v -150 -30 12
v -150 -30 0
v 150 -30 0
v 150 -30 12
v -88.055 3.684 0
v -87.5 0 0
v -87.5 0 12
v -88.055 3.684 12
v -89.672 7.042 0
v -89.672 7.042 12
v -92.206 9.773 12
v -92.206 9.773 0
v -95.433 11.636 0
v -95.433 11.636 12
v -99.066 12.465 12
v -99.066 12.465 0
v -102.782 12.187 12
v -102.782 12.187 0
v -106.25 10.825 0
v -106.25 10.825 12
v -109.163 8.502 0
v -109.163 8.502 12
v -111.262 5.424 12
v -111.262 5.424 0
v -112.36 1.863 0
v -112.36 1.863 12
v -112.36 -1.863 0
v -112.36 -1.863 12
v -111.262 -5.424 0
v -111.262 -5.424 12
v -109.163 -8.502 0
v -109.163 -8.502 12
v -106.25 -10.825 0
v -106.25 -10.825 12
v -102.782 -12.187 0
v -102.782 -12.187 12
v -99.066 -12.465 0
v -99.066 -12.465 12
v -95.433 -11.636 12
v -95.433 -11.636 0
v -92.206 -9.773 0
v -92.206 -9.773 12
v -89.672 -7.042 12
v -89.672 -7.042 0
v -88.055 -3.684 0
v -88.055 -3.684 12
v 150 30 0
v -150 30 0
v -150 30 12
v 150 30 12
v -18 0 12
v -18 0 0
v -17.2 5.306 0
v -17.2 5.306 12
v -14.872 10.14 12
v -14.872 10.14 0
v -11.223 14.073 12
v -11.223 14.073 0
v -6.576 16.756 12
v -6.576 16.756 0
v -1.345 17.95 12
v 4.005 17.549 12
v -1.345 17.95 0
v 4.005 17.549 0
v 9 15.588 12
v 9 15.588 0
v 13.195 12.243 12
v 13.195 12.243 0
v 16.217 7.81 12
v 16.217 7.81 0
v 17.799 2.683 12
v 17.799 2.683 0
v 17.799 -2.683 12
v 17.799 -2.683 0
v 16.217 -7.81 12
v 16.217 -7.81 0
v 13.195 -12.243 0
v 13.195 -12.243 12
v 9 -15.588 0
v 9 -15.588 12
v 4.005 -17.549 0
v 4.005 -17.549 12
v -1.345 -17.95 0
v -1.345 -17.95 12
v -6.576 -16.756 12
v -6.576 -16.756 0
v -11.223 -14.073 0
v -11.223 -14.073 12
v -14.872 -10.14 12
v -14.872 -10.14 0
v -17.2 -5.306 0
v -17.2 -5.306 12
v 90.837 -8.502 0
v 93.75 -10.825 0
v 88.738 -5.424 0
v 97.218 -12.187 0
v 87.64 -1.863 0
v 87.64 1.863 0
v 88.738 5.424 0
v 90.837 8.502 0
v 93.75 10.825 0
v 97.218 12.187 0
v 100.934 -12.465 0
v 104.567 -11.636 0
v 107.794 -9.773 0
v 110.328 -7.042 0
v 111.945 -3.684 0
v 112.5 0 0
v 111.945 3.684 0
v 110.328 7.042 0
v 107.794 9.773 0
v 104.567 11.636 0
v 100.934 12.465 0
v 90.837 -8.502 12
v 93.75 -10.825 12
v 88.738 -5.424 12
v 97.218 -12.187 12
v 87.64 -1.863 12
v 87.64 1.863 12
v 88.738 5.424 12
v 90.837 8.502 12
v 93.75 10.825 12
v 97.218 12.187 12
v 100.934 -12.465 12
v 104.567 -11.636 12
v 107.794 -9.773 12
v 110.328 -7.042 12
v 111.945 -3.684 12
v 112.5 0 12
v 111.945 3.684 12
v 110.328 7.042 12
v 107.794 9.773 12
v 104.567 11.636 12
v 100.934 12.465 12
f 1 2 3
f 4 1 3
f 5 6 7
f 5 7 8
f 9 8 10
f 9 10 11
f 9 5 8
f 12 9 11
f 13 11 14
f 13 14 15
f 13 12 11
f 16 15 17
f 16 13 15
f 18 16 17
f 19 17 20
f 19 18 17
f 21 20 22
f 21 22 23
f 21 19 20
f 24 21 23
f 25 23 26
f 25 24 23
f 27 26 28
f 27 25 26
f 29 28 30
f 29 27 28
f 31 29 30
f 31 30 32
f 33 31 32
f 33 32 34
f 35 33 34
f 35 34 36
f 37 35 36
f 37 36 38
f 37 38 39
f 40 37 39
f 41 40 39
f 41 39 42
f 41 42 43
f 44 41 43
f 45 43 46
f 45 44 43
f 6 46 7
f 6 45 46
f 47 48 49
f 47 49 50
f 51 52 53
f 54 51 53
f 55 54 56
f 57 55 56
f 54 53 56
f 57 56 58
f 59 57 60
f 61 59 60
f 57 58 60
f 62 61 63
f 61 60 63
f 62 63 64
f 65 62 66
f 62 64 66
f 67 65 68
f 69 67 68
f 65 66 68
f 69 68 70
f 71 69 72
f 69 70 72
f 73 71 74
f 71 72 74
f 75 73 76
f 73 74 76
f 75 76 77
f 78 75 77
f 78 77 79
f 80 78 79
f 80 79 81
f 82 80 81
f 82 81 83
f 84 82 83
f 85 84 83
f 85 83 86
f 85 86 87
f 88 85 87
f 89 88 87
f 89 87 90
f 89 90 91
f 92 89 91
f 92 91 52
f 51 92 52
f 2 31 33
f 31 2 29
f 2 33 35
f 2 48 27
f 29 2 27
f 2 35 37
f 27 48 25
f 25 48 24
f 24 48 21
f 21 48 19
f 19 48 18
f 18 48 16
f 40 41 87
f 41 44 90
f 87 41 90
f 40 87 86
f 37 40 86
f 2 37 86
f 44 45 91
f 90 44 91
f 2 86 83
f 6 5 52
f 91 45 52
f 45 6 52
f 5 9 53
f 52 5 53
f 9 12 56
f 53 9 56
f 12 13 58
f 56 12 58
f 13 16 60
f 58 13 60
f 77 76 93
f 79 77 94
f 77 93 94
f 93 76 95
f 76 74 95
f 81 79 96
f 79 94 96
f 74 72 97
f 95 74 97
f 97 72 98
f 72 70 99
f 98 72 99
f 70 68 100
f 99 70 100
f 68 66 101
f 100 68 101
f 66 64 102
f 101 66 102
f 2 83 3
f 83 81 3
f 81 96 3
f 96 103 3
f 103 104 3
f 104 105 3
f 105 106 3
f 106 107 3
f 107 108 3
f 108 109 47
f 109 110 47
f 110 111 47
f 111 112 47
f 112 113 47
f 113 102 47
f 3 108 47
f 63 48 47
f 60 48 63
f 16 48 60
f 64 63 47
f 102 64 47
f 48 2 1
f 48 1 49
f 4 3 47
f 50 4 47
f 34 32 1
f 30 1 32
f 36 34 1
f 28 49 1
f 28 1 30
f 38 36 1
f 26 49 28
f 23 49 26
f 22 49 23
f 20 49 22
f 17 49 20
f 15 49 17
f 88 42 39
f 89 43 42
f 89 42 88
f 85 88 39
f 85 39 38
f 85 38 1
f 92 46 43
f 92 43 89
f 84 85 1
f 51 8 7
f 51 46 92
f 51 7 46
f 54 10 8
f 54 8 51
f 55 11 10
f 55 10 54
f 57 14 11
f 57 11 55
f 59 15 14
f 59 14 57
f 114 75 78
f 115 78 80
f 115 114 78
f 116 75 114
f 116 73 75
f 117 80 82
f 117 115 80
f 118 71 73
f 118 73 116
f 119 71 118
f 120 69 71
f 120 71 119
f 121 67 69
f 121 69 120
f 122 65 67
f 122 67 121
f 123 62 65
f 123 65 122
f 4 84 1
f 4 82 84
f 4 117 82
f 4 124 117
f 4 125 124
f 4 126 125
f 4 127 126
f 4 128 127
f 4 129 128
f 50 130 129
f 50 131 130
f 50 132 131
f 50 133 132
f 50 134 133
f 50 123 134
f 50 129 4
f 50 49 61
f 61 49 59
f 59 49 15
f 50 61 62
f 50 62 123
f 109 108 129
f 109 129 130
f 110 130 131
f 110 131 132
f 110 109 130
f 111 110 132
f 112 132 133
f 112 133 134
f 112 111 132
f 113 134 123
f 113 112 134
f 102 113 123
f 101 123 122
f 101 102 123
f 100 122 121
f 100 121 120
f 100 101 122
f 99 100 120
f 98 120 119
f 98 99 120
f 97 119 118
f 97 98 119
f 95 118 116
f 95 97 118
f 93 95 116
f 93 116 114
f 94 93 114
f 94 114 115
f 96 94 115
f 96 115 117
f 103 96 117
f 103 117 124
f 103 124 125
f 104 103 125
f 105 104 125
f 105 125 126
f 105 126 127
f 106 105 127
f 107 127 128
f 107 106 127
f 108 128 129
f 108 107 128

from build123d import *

# Parameters (mm, degrees)
SKETCH_1_W          = 300
SKETCH_1_H          = 60
SKETCH_1_R          = 12.5
EXTRUDE_1_DEPTH     = 12
CUT_EXTRUDE_1_REACH = 155.441
SKETCH_2_R          = 18


with BuildPart() as part:
    # 草图1 → 凸台-拉伸1 (new body)
    with BuildSketch(Plane.XY):
        Rectangle(SKETCH_1_W, SKETCH_1_H)
        with Locations((100, 0)):
            Circle(SKETCH_1_R, mode=Mode.SUBTRACT)
        with Locations((-100, 0)):
            Circle(SKETCH_1_R, mode=Mode.SUBTRACT)
    extrude(amount=EXTRUDE_1_DEPTH)

    # 草图2 → 切除-拉伸1 (cut, up to next)
    with BuildSketch(Plane(origin=(0, 0, 0), x_dir=(-1, 0, 0), z_dir=(0, 0, -1)), mode=Mode.PRIVATE) as cut_extrude_1_sk1:
        Circle(SKETCH_2_R)
    cut_extrude_1_tool1 = extrude(cut_extrude_1_sk1.sketch, amount=-CUT_EXTRUDE_1_REACH, mode=Mode.PRIVATE) & part.part
    add(cut_extrude_1_tool1.solids().sort_by_distance((0, 0, 0))[0], mode=Mode.SUBTRACT)


solid = part.part
